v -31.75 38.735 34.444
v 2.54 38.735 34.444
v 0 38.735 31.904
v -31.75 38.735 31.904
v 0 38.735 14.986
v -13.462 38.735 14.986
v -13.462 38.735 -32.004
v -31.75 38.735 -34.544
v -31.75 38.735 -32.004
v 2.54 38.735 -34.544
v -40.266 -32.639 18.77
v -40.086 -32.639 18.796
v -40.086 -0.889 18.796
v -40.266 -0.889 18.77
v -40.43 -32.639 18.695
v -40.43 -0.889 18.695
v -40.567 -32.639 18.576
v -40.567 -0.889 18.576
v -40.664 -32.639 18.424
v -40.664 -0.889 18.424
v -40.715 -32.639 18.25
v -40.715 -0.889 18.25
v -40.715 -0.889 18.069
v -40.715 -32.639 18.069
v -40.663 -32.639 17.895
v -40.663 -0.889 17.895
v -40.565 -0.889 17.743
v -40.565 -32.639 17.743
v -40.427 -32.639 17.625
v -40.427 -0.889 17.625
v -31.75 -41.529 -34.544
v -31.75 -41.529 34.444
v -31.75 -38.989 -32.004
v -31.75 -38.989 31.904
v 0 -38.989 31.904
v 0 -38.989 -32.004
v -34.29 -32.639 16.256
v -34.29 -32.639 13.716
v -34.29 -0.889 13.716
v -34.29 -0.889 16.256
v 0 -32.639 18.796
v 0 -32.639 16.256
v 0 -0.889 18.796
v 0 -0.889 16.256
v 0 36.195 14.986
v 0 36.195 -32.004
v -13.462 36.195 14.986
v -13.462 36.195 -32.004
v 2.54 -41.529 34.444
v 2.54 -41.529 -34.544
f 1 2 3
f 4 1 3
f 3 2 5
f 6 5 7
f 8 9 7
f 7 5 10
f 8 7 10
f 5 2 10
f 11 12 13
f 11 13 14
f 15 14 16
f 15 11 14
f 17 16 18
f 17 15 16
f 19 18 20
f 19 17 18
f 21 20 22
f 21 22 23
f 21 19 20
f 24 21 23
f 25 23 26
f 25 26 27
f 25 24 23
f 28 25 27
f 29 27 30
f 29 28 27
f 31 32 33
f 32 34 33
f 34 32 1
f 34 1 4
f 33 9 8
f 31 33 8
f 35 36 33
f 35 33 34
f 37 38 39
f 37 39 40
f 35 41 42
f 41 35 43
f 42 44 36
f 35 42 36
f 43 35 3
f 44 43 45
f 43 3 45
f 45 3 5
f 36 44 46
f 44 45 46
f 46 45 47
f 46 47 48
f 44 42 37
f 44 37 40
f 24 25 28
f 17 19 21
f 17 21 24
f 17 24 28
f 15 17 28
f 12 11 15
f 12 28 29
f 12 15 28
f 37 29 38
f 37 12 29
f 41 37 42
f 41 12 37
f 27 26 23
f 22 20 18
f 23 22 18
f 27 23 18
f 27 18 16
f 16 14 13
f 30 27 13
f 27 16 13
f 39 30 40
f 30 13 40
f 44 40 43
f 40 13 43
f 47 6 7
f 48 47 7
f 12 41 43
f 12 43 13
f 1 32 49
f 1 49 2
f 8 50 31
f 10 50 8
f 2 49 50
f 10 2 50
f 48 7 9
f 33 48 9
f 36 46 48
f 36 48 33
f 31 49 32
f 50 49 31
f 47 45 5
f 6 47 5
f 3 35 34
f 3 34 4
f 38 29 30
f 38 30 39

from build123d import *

# Parameters (mm, degrees)
SKETCH1_W           = 68.987924
SKETCH1_H           = 80.264
BOSS_EXTRUDE3_DEPTH = 2.54
BOSS_EXTRUDE4_DEPTH = 31.75
SKETCH1_6_W         = 46.99
SKETCH1_6_H         = 2.54
BOSS_EXTRUDE5_DEPTH = 13.462
SKETCH2_W           = 2.54
SKETCH2_H           = 31.75
BOSS_EXTRUDE6_DEPTH = 34.29
BOSS_EXTRUDE7_DEPTH = 31.75


with BuildPart() as part:
    # Sketch1 → Boss-Extrude3 (new body)
    with BuildSketch(Plane(origin=(0, 0, 0), x_dir=(0, 0, -1), z_dir=(1, 0, 0))):
        with Locations((0.050038, -1.397)):
            Rectangle(SKETCH1_W, SKETCH1_H)
    extrude(amount=BOSS_EXTRUDE3_DEPTH)

    # Sketch1<5> → Boss-Extrude4 (add)
    with BuildSketch(Plane(origin=(0, 0, 0), x_dir=(0, 0, -1), z_dir=(1, 0, 0))):
        Polygon((34.544, 38.735), (32.004, 38.735), (32.004, 36.195), (32.004, -38.989), (-31.903924, -38.989), (-31.903924, 38.735), (-34.443924, 38.735), (-34.443924, 32.385), (-34.443924, -41.529), (34.544, -41.529), align=None)
    extrude(amount=-BOSS_EXTRUDE4_DEPTH)

    # Sketch1<6> → Boss-Extrude5 (add)
    with BuildSketch(Plane(origin=(0, 0, 0), x_dir=(0, 0, -1), z_dir=(1, 0, 0))):
        with Locations((8.509, 37.465)):
            Rectangle(SKETCH1_6_W, SKETCH1_6_H)
    extrude(amount=-BOSS_EXTRUDE5_DEPTH)

    # Sketch2 → Boss-Extrude6 (add)
    with BuildSketch(Plane.ZY):
        with Locations((17.526, -16.764)):
            Rectangle(SKETCH2_W, SKETCH2_H)
    extrude(amount=BOSS_EXTRUDE6_DEPTH)

    # Sketch3 → Boss-Extrude7 (add)
    with BuildSketch(Plane.XZ.offset(32.639)):
        with BuildLine():
            Line((-34.29, 18.796), (-40.086328026, 18.796))
            ThreePointArc((-40.086328026, 18.796), (-40.695965663, 18.338670907), (-40.427477229, 17.625423468))
            Line((-40.427477229, 17.625423468), (-34.29, 13.716))
            Line((-34.29, 13.716), (-34.29, 18.796))
        make_face()
    extrude(amount=-BOSS_EXTRUDE7_DEPTH)


solid = part.part
